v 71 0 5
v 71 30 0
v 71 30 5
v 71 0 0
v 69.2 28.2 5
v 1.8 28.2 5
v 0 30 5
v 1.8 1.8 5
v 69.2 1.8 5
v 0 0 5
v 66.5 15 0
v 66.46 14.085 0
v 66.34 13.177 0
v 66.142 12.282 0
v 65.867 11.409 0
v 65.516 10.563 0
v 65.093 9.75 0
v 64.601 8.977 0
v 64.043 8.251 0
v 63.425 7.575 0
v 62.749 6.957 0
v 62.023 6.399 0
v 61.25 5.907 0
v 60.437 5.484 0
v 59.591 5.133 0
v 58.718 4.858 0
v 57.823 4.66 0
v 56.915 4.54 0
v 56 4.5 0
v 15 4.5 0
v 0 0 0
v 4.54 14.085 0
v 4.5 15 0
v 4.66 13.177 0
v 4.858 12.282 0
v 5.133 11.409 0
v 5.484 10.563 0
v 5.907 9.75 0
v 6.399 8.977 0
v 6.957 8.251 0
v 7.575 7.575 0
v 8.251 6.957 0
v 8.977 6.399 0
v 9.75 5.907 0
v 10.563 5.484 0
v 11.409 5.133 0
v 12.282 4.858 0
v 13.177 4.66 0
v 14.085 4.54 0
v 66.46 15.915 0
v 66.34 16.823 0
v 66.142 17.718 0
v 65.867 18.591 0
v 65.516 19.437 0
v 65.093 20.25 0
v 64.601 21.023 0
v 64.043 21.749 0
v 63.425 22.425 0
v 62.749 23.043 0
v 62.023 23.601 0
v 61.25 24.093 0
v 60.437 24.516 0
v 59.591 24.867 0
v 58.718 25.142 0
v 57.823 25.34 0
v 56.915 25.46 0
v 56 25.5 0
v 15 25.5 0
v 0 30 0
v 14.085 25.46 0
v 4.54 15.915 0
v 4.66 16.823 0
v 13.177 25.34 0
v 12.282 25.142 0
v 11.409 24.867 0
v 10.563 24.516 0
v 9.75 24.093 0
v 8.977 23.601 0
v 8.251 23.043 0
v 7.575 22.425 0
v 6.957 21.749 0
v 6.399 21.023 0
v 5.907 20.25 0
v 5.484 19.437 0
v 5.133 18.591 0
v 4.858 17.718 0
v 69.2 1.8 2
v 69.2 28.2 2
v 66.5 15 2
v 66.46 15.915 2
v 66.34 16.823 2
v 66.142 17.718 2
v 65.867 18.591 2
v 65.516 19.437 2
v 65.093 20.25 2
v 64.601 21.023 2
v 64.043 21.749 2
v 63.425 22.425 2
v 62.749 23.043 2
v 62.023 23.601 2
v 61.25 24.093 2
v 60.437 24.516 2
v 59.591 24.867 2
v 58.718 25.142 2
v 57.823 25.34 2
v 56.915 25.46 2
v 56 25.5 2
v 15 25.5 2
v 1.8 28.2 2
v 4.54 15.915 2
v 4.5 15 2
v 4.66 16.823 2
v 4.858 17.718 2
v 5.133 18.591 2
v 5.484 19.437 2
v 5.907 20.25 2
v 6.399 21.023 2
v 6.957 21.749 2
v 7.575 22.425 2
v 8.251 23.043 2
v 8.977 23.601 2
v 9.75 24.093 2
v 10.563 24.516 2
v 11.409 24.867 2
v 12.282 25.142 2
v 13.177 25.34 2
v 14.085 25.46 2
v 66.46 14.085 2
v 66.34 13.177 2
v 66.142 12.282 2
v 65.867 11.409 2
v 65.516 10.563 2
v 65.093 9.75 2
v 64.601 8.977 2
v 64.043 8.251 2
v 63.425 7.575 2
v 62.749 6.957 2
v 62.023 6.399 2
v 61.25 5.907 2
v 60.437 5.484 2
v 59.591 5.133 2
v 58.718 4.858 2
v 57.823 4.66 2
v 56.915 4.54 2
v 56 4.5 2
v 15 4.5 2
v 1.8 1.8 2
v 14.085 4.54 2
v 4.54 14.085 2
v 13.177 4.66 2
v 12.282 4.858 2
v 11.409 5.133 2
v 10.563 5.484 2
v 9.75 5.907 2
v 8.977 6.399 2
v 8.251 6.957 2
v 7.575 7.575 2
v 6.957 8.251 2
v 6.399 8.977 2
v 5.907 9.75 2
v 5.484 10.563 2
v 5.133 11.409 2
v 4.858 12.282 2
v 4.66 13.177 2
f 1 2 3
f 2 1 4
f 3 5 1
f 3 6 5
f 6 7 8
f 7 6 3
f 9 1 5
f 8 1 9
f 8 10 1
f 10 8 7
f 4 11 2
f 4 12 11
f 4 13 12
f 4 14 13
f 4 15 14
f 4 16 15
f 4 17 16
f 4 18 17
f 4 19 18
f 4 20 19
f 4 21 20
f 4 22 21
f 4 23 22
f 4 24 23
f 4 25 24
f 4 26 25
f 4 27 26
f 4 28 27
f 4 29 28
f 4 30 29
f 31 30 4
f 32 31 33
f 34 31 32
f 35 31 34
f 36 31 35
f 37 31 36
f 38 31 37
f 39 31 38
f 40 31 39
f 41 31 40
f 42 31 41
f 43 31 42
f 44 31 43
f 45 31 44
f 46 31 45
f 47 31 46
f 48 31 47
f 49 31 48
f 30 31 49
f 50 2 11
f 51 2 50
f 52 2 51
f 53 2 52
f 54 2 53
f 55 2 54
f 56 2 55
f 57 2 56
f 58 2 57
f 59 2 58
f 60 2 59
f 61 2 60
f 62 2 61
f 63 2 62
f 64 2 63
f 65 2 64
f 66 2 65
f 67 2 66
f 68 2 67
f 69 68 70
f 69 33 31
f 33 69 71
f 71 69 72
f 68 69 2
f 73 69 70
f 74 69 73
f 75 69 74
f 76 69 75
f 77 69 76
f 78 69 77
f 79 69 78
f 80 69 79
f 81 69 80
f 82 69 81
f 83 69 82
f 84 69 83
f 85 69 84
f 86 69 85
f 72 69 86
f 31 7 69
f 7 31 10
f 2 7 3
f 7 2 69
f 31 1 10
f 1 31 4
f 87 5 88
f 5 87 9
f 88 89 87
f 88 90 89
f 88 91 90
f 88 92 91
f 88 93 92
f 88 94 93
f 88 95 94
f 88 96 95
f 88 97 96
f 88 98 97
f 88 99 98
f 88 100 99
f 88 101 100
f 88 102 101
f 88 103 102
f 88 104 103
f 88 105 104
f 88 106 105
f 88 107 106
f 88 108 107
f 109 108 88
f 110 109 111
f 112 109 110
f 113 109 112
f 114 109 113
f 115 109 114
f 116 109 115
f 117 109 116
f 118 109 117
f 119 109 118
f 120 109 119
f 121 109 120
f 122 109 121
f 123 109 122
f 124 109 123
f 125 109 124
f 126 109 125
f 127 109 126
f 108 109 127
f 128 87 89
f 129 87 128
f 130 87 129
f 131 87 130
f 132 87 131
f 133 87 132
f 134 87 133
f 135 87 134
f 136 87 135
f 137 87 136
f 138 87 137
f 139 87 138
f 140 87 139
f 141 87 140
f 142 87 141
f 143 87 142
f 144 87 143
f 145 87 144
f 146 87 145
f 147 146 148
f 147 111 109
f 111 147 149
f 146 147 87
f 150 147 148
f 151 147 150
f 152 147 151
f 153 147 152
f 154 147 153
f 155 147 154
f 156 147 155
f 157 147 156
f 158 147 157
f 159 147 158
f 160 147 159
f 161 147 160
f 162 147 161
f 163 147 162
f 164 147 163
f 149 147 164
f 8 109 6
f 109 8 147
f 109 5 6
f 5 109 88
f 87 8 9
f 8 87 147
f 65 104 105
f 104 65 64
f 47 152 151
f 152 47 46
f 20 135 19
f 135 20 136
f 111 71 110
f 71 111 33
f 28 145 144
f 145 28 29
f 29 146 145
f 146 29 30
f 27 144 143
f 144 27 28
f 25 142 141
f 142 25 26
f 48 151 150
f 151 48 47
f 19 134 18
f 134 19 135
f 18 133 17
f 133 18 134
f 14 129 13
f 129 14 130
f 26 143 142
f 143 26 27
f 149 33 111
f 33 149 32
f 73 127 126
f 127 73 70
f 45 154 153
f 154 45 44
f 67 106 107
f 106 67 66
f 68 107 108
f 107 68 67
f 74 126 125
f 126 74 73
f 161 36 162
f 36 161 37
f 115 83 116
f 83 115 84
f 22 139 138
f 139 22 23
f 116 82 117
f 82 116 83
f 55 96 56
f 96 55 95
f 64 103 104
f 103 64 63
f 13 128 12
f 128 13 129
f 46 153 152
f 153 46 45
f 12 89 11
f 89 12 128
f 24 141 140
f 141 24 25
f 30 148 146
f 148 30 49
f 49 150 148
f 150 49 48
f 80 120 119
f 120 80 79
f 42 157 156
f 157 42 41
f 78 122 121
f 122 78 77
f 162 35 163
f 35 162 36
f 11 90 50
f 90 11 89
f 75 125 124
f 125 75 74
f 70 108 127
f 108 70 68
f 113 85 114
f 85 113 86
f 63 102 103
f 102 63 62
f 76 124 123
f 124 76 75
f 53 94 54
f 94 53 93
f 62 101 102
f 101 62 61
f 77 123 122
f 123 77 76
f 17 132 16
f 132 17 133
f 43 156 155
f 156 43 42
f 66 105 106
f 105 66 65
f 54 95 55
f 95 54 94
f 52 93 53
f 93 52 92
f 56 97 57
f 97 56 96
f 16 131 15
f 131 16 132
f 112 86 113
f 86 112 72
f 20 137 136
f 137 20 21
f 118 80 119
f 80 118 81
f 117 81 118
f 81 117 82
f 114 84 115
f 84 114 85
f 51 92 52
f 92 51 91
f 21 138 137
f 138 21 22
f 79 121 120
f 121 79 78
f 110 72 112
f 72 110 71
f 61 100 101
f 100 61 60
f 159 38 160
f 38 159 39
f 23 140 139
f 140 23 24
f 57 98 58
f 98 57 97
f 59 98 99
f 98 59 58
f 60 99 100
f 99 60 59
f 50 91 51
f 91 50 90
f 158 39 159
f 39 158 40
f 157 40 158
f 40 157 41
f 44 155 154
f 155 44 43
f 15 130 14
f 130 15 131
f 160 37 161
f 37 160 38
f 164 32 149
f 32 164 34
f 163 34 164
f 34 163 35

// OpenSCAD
// file: config.scad
$fa = 5;
$fs = 0.2;

di_m4_t = 3.6;
di_m4_d = 4.4;
di_m4_nut = 8.5;
di_m2_t = 1.8;

w = 63;
l = 22;
h = 16;
t = 2;
led_stand = 1;
p = 2.5;
// main file
include <config.scad>

module lid() {
    g = 0.2;
    difference() {
        cube([w+4*t, l+4*t, t+3]);
        translate([t-g, t-g, t]) cube([w+2*t+2*g, l+2*t+2*g, t+3]);
        hull() {
            translate([l/2+2*t, l/2+2*t, 0]) cylinder(d=21, h=5);
            translate([w+4*t-l/2-2*t, l/2+2*t, 0]) cylinder(d=21, h=5);
        }
    }
}

lid();
